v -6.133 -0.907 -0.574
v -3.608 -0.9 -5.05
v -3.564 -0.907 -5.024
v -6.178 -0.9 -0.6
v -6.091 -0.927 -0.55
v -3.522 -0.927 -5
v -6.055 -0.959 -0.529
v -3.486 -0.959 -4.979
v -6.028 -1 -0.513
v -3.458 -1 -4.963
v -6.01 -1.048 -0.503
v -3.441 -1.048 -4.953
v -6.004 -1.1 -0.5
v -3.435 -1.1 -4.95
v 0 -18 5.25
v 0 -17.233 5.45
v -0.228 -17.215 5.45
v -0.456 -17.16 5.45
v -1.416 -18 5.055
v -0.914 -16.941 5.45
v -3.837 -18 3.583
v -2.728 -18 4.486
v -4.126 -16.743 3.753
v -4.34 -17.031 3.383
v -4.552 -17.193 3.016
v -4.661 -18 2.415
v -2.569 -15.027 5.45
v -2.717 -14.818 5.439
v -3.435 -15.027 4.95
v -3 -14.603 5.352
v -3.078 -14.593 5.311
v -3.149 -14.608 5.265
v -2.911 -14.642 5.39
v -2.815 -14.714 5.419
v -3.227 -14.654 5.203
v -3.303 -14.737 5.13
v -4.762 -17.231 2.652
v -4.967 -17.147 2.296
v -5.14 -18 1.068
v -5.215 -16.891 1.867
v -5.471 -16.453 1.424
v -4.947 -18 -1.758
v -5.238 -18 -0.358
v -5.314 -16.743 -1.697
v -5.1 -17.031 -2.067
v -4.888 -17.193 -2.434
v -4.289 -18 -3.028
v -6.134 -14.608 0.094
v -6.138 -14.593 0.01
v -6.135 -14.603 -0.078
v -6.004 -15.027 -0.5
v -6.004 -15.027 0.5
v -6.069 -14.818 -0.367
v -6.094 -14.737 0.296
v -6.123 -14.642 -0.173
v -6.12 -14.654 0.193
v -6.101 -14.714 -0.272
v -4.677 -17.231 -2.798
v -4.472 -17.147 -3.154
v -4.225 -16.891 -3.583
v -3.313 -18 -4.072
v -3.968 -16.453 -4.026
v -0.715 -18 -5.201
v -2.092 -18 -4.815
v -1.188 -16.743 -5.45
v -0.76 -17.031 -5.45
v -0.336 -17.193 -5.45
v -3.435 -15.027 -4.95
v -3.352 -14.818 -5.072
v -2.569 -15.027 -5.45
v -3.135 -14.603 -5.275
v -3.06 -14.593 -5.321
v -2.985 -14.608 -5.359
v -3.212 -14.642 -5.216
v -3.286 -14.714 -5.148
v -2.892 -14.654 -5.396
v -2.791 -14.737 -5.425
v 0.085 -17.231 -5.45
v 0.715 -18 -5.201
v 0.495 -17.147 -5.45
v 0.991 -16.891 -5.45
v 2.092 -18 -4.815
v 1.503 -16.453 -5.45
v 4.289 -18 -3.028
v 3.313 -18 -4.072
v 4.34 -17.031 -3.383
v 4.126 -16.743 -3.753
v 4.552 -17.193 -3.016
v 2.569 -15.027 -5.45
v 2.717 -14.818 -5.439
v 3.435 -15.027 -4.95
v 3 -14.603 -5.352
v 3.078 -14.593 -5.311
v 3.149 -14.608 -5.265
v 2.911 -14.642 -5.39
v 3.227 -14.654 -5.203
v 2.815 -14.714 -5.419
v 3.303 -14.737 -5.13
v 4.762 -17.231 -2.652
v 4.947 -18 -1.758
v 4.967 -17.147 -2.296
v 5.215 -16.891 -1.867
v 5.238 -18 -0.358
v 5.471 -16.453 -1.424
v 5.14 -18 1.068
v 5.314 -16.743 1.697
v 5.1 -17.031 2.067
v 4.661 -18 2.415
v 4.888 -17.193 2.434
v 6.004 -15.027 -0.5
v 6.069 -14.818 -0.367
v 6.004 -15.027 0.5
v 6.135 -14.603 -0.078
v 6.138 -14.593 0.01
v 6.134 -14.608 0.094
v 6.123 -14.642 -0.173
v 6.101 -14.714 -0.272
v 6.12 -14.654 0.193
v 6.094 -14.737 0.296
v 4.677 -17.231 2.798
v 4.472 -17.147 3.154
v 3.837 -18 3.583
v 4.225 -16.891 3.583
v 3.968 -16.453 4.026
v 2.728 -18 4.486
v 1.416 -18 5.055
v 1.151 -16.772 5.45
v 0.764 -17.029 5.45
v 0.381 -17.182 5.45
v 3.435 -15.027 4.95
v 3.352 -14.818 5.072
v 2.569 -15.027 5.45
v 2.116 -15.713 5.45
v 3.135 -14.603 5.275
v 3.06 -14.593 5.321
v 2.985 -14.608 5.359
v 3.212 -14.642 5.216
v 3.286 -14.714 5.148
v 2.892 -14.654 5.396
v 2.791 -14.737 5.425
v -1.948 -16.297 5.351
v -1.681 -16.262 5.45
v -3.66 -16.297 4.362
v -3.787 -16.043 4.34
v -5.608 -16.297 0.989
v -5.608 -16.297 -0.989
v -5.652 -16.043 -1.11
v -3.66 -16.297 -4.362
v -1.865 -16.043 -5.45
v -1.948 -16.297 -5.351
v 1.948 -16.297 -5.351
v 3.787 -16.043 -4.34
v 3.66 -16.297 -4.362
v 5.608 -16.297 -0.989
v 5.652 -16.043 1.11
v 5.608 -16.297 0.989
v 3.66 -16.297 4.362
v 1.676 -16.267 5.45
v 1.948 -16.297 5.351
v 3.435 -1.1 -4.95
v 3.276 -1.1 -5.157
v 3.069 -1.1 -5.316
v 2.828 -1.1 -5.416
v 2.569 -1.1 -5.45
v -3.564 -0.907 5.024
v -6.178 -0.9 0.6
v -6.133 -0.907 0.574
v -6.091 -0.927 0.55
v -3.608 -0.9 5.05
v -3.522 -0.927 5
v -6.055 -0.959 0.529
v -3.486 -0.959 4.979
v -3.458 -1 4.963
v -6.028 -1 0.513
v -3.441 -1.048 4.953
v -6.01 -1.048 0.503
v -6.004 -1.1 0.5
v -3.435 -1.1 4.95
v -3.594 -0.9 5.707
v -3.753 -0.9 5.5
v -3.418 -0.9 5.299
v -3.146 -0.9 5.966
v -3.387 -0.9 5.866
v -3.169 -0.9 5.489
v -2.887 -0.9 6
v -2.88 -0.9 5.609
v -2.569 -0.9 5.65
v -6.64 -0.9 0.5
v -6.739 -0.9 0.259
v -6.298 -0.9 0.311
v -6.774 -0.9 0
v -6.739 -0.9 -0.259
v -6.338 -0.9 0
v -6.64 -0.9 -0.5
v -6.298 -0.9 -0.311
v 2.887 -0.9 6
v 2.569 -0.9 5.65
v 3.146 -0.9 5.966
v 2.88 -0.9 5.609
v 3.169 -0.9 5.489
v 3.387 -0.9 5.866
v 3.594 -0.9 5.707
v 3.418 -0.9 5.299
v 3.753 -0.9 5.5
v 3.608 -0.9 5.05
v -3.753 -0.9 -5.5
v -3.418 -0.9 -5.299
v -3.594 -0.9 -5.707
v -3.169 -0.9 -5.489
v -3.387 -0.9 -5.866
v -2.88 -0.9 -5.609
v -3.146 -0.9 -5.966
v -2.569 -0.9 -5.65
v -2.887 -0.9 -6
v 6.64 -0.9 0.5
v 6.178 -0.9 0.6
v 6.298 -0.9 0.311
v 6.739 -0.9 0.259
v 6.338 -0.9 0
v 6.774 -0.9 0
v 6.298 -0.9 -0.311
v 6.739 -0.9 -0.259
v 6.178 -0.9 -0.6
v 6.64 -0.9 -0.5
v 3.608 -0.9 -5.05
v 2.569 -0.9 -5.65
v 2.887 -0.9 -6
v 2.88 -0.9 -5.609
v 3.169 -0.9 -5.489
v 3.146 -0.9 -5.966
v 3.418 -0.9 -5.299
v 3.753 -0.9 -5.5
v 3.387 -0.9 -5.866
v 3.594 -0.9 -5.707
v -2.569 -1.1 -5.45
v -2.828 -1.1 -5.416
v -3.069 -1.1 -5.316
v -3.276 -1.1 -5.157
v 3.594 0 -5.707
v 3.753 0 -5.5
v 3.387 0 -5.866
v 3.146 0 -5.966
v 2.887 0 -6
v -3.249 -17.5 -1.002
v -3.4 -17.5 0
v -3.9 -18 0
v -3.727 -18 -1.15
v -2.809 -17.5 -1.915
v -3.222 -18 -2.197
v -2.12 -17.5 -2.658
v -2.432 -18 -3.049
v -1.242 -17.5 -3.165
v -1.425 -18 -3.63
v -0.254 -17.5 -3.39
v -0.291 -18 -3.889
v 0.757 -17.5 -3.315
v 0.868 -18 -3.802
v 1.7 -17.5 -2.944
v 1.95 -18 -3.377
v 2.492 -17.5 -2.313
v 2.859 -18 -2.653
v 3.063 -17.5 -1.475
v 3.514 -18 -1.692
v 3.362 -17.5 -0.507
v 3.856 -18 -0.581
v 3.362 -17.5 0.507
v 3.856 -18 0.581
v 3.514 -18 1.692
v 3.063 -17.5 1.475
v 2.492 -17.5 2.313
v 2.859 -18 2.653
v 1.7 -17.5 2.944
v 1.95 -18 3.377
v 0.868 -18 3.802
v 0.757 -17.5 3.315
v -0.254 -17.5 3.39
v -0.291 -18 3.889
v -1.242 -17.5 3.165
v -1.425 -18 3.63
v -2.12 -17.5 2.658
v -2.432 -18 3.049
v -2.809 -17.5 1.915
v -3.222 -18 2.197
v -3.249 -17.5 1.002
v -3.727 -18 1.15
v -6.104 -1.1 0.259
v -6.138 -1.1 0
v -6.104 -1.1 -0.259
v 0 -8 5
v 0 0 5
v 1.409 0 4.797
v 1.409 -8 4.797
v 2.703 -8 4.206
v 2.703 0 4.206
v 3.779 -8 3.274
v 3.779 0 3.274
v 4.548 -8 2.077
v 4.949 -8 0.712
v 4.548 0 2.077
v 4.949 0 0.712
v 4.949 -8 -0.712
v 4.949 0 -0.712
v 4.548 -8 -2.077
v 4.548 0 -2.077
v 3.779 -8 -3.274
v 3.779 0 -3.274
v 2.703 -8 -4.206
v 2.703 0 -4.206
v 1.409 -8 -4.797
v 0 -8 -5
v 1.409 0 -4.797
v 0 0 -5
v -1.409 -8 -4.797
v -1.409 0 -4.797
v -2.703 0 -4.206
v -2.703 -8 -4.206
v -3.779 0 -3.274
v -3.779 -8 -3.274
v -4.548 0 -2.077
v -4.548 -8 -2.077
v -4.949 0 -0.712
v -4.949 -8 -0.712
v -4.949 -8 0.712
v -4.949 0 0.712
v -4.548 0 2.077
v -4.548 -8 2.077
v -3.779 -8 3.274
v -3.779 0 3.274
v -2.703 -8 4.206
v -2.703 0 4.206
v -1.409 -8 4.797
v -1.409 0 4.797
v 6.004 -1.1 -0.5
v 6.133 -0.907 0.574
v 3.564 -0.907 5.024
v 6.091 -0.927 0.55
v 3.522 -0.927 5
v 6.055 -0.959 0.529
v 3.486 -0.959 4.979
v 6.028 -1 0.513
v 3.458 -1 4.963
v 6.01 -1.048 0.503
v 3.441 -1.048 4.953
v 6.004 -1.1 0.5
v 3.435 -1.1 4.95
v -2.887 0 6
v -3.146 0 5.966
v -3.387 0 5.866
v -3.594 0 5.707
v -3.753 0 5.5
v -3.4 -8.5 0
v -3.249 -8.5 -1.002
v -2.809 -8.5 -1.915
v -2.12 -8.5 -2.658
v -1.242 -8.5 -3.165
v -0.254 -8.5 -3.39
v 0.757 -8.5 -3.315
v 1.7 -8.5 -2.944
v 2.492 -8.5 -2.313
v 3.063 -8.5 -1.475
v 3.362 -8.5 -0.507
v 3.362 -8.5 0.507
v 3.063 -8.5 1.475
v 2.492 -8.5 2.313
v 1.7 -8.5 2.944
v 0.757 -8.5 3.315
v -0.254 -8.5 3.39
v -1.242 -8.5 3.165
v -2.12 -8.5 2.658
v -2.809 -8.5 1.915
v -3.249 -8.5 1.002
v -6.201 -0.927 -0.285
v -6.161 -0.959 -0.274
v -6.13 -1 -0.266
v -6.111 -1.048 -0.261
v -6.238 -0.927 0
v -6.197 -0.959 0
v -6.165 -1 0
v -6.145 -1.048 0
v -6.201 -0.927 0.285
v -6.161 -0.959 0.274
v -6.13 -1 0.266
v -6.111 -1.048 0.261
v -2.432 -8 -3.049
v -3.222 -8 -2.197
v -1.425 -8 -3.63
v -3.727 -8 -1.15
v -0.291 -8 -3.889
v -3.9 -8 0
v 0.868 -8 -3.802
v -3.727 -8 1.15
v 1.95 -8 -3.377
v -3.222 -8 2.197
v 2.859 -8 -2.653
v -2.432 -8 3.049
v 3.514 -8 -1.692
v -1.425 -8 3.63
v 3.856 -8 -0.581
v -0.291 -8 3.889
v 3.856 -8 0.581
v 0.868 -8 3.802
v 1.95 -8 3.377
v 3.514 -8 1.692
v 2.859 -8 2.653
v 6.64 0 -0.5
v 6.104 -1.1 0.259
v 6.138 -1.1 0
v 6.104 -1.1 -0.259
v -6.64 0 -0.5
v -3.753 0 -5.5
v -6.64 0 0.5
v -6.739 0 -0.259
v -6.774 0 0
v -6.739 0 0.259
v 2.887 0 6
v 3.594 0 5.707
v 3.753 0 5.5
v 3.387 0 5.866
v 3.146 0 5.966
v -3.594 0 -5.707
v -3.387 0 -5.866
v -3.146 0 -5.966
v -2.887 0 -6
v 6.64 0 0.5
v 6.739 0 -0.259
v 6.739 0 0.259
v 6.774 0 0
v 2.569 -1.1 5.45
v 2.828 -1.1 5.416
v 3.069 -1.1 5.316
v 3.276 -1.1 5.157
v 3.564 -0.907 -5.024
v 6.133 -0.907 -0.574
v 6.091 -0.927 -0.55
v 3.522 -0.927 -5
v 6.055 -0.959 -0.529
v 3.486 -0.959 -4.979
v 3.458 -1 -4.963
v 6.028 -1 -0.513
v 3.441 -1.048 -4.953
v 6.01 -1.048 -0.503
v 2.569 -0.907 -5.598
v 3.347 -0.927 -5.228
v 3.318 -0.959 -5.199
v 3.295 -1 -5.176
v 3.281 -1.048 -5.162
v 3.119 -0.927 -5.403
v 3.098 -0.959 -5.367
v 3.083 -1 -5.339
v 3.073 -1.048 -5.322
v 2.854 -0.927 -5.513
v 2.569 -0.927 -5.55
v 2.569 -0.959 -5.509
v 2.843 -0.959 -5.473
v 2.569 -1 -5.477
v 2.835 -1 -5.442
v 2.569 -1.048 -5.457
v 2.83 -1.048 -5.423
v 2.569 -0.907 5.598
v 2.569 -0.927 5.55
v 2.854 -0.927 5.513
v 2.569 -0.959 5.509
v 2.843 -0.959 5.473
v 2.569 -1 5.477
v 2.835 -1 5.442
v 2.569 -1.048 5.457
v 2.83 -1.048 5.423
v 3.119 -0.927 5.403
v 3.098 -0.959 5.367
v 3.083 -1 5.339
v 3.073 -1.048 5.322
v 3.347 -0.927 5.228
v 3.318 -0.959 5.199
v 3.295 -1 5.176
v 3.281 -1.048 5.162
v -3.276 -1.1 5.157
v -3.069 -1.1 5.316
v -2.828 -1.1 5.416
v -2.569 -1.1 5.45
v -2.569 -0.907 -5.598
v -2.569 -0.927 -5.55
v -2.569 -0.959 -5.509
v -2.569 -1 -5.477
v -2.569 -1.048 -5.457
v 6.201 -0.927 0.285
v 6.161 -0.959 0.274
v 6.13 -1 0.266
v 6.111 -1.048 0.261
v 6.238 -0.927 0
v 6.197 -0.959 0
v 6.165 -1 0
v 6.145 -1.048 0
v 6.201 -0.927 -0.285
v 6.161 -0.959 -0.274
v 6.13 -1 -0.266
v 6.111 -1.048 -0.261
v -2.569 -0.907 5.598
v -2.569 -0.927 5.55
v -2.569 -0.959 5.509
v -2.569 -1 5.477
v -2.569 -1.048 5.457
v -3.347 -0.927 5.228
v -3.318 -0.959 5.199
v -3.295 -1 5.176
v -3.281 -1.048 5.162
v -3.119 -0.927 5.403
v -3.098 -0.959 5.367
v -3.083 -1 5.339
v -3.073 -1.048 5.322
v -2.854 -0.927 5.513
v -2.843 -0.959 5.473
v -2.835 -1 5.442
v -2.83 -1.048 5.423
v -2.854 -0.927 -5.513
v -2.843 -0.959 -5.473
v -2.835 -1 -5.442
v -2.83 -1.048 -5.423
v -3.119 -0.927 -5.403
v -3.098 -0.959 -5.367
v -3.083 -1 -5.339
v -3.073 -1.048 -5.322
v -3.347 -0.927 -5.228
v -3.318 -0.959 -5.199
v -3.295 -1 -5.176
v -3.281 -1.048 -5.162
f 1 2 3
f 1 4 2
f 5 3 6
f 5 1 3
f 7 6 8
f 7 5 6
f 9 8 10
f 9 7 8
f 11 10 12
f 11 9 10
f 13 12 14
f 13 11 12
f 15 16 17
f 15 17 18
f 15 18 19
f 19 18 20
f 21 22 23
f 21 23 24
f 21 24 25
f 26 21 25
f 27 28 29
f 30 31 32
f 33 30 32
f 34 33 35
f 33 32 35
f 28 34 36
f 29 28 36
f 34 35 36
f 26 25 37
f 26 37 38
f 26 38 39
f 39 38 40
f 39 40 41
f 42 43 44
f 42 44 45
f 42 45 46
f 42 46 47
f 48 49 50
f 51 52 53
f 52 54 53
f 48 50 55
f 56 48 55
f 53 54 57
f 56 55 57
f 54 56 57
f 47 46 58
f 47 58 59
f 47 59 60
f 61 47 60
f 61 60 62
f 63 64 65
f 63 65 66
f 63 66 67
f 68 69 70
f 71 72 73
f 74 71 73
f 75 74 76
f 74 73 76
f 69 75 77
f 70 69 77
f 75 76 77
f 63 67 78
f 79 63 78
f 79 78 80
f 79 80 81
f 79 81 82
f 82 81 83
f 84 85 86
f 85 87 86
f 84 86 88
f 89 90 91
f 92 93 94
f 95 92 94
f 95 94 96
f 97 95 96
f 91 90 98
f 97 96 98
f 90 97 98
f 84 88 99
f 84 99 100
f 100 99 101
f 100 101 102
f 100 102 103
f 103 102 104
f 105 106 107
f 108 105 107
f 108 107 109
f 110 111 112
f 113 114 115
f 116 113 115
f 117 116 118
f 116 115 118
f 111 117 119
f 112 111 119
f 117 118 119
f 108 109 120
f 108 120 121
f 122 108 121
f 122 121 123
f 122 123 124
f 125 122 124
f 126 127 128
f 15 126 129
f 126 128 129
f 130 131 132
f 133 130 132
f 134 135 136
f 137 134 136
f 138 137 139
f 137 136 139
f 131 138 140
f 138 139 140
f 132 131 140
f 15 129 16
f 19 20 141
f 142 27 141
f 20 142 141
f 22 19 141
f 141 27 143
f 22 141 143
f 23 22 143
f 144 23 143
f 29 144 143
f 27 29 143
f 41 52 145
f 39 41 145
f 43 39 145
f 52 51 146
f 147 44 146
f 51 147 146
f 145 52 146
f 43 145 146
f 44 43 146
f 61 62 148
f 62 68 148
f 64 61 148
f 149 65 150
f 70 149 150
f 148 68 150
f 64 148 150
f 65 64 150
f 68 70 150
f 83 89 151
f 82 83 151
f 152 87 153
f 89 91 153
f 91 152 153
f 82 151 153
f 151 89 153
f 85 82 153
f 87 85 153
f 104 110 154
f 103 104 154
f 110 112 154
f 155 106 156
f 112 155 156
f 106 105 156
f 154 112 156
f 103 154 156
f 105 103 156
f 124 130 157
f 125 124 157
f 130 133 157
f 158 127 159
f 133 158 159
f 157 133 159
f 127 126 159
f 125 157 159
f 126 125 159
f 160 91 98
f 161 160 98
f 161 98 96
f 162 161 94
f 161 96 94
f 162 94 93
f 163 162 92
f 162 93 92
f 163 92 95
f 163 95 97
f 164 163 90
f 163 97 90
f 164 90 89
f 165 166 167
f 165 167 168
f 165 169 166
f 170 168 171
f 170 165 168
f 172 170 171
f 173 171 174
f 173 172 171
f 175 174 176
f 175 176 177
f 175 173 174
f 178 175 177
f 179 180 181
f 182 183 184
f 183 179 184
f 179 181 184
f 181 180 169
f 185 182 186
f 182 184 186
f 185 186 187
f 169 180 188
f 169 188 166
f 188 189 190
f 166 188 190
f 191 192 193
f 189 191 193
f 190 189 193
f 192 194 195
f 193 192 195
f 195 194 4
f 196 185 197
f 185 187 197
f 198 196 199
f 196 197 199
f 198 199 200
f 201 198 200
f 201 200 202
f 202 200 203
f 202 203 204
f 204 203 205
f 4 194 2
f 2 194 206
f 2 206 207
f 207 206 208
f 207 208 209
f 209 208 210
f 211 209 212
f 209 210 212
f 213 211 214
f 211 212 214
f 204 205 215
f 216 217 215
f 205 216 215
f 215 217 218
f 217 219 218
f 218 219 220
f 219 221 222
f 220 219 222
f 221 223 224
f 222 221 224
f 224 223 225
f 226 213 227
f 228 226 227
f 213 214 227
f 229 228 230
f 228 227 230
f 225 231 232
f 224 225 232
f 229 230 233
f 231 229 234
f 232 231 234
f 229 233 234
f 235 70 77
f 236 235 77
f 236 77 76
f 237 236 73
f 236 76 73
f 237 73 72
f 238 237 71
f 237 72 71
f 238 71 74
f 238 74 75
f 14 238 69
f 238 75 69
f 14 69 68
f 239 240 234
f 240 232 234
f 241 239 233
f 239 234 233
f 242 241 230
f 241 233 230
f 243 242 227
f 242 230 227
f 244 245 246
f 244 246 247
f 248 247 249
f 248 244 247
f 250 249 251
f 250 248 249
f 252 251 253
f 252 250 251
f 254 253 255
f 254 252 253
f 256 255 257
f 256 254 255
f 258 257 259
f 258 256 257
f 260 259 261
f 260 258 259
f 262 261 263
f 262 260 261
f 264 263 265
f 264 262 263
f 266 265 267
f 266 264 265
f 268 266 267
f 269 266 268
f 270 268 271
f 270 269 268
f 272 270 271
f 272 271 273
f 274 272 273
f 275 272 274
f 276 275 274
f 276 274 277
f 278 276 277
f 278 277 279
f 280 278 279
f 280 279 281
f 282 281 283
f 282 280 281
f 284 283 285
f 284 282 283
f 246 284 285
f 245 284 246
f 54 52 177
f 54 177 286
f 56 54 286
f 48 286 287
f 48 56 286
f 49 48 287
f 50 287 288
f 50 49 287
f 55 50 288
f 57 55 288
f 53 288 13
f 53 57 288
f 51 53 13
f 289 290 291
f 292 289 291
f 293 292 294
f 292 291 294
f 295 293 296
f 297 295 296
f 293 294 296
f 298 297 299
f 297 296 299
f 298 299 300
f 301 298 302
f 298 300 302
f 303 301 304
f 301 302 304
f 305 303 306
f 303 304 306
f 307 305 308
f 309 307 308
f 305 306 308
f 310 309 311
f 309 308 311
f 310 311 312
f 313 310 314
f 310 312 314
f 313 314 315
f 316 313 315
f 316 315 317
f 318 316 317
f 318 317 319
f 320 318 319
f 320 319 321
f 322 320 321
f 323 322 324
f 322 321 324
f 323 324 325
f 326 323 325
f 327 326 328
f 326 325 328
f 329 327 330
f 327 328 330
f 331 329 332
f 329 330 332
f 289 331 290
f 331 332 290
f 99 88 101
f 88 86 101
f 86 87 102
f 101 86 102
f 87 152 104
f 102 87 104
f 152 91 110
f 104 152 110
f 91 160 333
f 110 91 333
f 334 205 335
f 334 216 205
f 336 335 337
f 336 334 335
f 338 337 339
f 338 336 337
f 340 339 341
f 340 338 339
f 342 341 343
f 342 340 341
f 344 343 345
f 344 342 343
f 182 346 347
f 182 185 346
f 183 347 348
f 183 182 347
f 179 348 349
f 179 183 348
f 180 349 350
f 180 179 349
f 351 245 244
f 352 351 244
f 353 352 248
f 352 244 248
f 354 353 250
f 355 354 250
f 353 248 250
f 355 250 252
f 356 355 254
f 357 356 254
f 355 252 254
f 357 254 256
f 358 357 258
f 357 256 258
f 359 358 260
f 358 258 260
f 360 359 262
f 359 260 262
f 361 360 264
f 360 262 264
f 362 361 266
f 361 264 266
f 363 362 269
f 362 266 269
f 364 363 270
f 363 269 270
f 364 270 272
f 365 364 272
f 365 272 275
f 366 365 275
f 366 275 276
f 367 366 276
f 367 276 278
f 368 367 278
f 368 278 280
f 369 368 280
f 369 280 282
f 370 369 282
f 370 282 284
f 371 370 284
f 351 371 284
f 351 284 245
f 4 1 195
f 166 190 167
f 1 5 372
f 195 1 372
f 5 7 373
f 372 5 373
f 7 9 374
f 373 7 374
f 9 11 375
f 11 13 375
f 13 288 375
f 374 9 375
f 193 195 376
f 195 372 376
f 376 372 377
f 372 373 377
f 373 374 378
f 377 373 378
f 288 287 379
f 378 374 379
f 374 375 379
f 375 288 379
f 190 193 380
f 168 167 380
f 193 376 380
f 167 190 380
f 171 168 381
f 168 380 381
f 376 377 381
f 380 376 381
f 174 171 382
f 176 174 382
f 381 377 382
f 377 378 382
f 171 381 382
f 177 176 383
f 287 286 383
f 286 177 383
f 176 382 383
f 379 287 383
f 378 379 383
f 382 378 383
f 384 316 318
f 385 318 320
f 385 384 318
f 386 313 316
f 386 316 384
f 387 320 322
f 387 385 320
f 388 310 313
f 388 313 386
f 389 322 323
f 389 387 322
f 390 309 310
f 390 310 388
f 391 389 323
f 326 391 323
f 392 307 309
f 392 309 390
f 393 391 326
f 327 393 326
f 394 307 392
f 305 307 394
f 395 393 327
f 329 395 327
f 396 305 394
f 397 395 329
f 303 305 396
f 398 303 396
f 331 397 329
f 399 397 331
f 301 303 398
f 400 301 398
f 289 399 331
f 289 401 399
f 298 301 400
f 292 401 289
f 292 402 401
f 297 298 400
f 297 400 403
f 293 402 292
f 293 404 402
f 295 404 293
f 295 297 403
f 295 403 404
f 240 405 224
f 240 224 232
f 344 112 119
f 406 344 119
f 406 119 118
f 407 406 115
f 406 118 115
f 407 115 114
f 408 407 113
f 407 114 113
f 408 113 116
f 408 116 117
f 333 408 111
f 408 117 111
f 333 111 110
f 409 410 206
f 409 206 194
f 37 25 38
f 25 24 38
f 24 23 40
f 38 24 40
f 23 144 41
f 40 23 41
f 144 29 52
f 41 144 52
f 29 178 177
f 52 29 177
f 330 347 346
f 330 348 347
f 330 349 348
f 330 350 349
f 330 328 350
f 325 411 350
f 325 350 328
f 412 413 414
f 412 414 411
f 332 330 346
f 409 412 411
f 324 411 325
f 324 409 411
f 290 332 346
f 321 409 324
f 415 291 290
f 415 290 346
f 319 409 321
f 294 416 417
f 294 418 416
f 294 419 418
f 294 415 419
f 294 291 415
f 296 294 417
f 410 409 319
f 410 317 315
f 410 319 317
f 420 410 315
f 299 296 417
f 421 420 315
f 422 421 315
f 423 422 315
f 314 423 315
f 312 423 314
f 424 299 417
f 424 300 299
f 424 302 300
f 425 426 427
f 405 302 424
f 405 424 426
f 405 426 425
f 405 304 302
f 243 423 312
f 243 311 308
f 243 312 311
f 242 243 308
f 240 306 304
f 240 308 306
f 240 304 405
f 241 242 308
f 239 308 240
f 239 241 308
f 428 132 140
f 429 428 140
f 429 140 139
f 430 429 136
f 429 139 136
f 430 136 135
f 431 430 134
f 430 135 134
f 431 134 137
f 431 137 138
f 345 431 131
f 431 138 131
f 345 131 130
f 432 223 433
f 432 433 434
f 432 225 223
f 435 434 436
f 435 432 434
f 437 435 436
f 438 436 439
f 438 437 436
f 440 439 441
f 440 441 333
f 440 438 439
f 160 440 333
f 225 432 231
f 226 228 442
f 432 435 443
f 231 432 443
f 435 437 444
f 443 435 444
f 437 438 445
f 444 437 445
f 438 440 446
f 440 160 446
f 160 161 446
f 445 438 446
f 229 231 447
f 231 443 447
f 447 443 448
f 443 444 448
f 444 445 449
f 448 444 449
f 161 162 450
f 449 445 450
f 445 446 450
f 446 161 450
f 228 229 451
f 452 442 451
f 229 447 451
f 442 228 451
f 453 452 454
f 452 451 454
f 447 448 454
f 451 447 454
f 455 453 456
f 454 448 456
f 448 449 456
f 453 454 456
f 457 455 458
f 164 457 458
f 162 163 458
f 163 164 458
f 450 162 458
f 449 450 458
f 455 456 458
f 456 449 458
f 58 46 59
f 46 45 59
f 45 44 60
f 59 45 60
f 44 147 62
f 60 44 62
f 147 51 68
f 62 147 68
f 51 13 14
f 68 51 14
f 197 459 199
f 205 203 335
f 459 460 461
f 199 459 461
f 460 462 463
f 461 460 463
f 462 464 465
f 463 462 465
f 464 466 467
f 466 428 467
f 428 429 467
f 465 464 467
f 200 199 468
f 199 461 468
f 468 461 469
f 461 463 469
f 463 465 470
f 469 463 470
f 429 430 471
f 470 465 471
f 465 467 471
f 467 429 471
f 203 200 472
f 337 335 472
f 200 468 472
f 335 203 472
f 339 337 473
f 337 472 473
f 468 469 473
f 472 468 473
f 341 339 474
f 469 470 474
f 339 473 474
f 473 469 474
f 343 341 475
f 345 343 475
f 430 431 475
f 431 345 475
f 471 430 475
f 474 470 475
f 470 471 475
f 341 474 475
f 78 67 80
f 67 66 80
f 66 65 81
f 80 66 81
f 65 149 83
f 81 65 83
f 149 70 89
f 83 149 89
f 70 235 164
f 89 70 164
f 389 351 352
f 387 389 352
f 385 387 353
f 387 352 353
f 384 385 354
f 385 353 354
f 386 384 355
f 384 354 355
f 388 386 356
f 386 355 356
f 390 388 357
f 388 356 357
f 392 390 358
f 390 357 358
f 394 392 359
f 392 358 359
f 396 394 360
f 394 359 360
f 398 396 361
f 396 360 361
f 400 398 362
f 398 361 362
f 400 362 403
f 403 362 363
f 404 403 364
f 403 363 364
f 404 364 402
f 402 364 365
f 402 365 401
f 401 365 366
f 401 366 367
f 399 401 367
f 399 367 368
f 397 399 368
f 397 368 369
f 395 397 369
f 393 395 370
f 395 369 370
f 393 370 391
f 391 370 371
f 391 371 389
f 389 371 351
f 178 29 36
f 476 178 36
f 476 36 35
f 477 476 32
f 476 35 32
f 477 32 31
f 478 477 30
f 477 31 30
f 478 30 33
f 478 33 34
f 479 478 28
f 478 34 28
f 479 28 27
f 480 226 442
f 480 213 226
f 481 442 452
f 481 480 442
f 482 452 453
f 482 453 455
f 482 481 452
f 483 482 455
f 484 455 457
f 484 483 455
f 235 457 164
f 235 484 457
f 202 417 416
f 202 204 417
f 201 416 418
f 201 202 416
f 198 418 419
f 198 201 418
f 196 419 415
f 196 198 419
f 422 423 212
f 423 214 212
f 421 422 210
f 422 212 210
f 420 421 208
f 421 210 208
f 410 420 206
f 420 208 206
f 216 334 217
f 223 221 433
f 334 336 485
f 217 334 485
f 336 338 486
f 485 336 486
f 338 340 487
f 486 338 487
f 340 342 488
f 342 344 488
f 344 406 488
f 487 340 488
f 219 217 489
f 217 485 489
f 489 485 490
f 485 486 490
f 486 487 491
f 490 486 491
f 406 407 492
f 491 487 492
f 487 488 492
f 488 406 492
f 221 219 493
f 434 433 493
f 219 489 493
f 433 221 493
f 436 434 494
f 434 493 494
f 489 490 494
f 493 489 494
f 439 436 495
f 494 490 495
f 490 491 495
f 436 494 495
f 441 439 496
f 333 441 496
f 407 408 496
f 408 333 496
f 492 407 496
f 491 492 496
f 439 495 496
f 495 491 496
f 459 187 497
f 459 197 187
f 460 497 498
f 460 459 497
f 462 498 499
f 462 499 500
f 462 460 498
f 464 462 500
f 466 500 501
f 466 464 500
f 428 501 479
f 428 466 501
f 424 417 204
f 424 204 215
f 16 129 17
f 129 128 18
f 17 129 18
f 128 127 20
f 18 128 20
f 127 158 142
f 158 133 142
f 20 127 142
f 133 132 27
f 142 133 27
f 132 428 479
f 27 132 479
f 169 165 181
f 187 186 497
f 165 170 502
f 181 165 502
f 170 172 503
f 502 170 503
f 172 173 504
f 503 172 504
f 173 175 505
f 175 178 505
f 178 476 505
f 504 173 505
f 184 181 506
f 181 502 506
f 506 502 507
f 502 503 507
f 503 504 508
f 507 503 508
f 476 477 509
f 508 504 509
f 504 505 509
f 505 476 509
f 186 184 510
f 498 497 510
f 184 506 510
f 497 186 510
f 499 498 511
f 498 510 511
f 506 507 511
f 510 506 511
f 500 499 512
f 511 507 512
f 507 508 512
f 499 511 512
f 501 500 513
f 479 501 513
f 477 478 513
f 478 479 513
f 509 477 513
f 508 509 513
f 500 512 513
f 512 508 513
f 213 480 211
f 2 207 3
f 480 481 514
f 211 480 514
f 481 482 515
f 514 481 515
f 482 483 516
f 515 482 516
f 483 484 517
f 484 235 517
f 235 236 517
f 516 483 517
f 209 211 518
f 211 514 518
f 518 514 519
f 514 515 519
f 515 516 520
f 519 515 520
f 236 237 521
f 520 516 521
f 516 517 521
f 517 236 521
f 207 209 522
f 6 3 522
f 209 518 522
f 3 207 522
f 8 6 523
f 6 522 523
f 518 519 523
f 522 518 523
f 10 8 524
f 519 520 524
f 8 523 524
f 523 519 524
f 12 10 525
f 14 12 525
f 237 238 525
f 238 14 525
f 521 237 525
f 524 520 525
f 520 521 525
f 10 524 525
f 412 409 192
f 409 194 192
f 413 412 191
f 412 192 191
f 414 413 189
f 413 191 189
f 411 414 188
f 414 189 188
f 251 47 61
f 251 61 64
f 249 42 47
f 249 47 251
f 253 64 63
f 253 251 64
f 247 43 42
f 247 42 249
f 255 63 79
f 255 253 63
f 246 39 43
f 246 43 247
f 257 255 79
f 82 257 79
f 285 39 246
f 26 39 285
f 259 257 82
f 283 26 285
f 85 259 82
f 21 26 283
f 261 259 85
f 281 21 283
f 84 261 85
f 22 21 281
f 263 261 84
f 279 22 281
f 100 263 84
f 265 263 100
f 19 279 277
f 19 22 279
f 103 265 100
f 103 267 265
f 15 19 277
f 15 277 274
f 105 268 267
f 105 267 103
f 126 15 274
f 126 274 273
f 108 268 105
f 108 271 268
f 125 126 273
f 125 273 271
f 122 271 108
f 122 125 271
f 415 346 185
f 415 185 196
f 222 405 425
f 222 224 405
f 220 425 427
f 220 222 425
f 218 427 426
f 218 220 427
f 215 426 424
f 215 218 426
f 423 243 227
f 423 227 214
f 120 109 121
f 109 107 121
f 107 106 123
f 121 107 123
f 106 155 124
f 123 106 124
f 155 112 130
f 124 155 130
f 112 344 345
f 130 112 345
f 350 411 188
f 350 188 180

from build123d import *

# Parameters (mm, degrees)
BOSS_EXTRUDE1_DEPTH   = 0.9
BOSS_EXTRUDE2_DEPTH   = 17.1
FILLET2_R             = 1
FILLET3_R             = 0.2
SKETCH4_R             = 5
CUT_EXTRUDE1_DEPTH    = 8
M8_TAPPED_HOLE1_D     = 6.8
M8_TAPPED_HOLE1_DEPTH = 22.25
M8_TAPPED_HOLE1_TIP   = 2.042926105
CHAMFER1_SIZE         = 0.5


with BuildPart() as part:
    # Sketch1 → Boss-Extrude1 (new body)
    with BuildSketch(Plane(origin=(0, 0, 0), x_dir=(1, 0, 0), z_dir=(0, 1, 0))):
        Polygon((6.92820323, 0), (3.464101615, 6), (-3.464101615, 6), (-6.92820323, 0), (-3.464101615, -6), (3.464101615, -6), align=None)
    extrude(amount=-BOSS_EXTRUDE1_DEPTH)

    # Sketch2 → Boss-Extrude2 (add)
    with BuildSketch(Plane.XZ.offset(0.9)):
        Polygon((-6.293117934, 0), (-3.146558967, -5.45), (3.146558967, -5.45), (6.293117934, 0), (3.146558967, 5.45), (-3.146558967, 5.45), align=None)
    extrude(amount=BOSS_EXTRUDE2_DEPTH)

    # Sketch3 → Cut-Revolve1 (revolve, cut)
    with BuildSketch(Plane.XY, mode=Mode.PRIVATE) as cut_revolve1_sk:
        Polygon((-6.293117934, -18), (-5.25, -18), (-6.293117934, -14), align=None)
    revolve(cut_revolve1_sk.sketch.rotate(Axis((0, 0, 0), (0, -1, 0)), 270), axis=Axis((0, 0, 0), (0, -1, 0)), mode=Mode.SUBTRACT)

    # Fillet2
    fillet2_edges = [part.edges().sort_by_distance(p)[0] for p in [
        (-6.92820323, -0.45, 0),
        (-6.293117934, -7.45, 0),
        (-3.146558967, -7.45, -5.45),
        (-3.464101615, -0.45, -6),
        (3.146558967, -7.45, -5.45),
        (3.464101615, -0.45, -6),
        (6.293117934, -7.45, 0),
        (6.92820323, -0.45, 0),
        (3.146558967, -7.45, 5.45),
        (3.464101615, -0.45, 6),
        (-3.146558967, -7.45, 5.45),
        (-3.464101615, -0.45, 6),
    ]]
    fillet(fillet2_edges, radius=FILLET2_R)

    # Fillet3
    fillet3_edges = [part.edges().sort_by_distance(p)[0] for p in [
        (-3.069208698, -0.9, -5.316025404),
        (3.069208698, -0.9, -5.316025404),
        (6.138417396, -0.9, 0),
        (3.069208698, -0.9, 5.316025404),
        (-3.069208698, -0.9, 5.316025404),
        (-6.138417396, -0.9, 0),
        (0, -0.9, -5.45),
        (-4.719838451, -0.9, -2.725),
        (-4.719838451, -0.9, 2.725),
        (0, -0.9, 5.45),
        (4.719838451, -0.9, 2.725),
        (4.719838451, -0.9, -2.725),
    ]]
    fillet(fillet3_edges, radius=FILLET3_R)

    # Sketch4 → Cut-Extrude1 (cut)
    with BuildSketch(Plane(origin=(0, 0, 0), x_dir=(1, 0, 0), z_dir=(0, 1, 0))):
        with Locations(Location((0, 0, 0), (0, 0, 270))):
            Circle(SKETCH4_R)
    extrude(amount=-CUT_EXTRUDE1_DEPTH, mode=Mode.SUBTRACT)

    # M8 Tapped Hole1
    with Locations(Plane(origin=(0, -8, 0), x_dir=(1, 0, 0), z_dir=(0, 1, 0))):
        with Locations((0, 0)):
            Hole(M8_TAPPED_HOLE1_D / 2, depth=M8_TAPPED_HOLE1_DEPTH)
            with Locations((0, 0, -(M8_TAPPED_HOLE1_DEPTH + M8_TAPPED_HOLE1_TIP / 2))):  # 118° drill point
                Cone(0, M8_TAPPED_HOLE1_D / 2, M8_TAPPED_HOLE1_TIP, mode=Mode.SUBTRACT)

    # Chamfer1
    chamfer1_edges = [part.edges().sort_by_distance(p)[0] for p in [
        (3.4, -18, 0),
        (3.4, -8, 0),
    ]]
    chamfer(chamfer1_edges, length=CHAMFER1_SIZE)


solid = part.part
